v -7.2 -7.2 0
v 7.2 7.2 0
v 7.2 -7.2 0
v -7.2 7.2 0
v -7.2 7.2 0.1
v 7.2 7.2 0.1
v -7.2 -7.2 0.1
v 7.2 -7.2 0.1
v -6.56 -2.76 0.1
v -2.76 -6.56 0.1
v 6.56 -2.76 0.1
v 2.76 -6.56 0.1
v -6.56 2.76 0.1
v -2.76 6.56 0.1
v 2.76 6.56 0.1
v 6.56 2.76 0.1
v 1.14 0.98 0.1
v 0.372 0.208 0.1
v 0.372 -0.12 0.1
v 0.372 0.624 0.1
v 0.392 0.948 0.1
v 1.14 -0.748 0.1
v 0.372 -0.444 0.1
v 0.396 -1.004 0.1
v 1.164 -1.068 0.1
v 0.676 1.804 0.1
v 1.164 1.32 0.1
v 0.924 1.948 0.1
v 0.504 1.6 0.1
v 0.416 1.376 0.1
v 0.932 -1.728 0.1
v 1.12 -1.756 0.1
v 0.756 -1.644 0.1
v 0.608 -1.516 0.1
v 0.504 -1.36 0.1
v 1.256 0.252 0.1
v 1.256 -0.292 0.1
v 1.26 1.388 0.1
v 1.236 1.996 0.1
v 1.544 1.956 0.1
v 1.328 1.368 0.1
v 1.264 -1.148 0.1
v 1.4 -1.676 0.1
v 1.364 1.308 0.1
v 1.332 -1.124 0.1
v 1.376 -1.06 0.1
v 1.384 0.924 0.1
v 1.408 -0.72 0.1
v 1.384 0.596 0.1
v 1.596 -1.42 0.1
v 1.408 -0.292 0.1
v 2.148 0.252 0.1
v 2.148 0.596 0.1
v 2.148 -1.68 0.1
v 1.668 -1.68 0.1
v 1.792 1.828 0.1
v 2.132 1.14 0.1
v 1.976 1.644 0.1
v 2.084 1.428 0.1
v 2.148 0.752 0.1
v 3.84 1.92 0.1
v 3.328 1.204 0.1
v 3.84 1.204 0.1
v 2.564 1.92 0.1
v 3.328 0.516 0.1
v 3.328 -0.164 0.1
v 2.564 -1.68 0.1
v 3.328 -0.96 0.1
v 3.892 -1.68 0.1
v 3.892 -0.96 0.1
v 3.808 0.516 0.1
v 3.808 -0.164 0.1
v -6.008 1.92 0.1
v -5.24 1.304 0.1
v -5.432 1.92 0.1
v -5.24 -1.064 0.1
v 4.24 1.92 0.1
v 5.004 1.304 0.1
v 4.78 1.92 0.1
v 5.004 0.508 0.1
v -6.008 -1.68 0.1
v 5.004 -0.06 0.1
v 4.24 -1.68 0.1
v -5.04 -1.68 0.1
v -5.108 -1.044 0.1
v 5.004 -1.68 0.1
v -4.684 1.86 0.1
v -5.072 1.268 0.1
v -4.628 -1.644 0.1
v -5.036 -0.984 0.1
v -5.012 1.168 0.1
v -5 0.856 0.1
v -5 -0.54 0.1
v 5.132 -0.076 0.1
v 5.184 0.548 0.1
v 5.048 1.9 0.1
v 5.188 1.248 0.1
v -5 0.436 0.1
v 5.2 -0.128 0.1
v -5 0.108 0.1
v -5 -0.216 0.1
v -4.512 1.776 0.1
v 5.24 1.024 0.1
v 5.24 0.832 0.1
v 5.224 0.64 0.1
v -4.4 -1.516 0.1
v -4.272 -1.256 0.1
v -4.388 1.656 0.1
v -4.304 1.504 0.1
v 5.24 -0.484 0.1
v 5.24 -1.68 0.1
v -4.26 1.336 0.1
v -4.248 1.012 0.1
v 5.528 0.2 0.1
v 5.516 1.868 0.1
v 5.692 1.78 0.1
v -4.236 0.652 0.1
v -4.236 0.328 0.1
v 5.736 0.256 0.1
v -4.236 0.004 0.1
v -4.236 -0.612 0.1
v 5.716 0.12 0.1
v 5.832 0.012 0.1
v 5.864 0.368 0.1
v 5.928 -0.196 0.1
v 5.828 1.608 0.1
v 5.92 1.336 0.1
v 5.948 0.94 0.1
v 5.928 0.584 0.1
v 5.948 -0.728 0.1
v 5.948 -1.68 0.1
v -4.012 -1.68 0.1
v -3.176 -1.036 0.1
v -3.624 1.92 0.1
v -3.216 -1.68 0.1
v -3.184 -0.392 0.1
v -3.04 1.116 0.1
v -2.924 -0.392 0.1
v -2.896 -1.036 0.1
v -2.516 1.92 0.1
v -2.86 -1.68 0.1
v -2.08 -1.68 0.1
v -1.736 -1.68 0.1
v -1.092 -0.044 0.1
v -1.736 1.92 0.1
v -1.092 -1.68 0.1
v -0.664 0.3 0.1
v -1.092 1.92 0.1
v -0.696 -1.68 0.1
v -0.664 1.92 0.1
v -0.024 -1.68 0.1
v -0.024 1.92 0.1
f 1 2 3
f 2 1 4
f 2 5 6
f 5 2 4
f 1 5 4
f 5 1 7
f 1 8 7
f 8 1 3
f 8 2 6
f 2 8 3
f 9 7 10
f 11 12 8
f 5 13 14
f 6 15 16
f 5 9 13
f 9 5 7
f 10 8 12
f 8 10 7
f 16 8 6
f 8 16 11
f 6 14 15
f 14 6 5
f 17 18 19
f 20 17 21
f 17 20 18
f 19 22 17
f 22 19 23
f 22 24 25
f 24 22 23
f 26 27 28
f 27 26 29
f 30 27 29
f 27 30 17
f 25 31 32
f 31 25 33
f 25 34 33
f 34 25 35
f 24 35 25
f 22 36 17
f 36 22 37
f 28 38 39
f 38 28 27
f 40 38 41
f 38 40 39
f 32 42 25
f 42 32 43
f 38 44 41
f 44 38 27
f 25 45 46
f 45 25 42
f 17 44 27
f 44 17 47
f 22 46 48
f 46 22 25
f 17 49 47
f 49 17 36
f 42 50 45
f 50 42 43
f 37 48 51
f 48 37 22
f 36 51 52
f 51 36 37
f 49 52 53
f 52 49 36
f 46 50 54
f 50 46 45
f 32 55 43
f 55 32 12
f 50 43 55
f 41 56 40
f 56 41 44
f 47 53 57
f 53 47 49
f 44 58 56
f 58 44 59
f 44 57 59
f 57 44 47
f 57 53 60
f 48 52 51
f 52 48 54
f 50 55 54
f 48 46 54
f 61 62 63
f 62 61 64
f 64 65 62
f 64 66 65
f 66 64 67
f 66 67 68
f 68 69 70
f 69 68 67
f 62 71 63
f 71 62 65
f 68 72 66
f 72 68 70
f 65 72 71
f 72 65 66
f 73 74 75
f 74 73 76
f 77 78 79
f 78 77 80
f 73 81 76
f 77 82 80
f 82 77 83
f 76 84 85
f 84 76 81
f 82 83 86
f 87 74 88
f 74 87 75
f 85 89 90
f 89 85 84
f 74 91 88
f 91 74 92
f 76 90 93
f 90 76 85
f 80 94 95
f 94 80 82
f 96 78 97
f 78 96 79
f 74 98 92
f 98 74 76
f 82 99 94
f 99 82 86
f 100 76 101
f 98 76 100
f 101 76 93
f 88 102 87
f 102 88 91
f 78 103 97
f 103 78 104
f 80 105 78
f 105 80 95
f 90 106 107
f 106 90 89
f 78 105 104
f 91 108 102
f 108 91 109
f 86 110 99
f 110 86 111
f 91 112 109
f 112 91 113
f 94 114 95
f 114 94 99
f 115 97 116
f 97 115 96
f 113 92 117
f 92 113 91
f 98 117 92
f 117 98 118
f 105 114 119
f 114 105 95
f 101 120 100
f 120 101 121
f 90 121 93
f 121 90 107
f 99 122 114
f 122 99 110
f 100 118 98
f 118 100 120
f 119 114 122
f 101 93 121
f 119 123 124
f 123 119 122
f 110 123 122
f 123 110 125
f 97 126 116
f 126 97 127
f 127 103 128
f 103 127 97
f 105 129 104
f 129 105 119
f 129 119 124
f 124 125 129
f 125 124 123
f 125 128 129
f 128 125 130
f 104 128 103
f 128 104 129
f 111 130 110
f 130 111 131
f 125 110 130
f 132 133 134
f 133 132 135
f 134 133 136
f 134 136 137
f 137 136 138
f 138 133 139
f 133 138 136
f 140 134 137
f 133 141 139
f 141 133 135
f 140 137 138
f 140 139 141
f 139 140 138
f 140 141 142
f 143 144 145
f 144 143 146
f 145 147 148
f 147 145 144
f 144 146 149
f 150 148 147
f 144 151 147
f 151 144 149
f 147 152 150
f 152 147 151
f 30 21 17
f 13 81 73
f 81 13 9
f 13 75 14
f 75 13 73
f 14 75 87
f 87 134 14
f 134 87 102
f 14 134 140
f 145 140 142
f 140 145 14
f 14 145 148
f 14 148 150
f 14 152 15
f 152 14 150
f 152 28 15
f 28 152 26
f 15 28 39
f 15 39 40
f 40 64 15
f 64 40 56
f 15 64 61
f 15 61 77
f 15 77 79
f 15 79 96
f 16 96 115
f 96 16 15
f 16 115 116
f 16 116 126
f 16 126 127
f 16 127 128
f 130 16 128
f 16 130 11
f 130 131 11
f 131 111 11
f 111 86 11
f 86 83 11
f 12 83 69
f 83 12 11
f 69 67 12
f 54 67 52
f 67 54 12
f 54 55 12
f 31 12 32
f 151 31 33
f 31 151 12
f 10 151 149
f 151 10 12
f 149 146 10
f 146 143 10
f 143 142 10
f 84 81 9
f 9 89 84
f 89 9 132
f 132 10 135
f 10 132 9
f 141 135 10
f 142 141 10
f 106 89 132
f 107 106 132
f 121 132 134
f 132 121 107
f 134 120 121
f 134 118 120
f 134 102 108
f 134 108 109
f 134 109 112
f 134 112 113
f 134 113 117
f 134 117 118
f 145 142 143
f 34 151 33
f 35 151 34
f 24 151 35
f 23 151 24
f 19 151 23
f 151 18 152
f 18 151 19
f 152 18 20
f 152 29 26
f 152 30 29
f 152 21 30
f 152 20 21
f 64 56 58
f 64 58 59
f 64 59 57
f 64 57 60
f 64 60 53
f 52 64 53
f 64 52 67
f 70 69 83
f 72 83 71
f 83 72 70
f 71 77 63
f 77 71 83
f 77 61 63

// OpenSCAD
// file: ../p/box5-12.scad
use <../lib.scad>
function ldraw_lib__box5_12() = [
// 0 Box with 5 Faces without Any Edges
// 0 Name: box5-12.dat
// 0 Author: Chris Dee [cwdee]
// 0 !LDRAW_ORG Primitive UPDATE 2009-02
// 0 !LICENSE Licensed under CC BY 4.0 : see CAreadme.txt
// 
// 0 BFC CERTIFY CCW
  [0,"BFC","CERTIFY"],
  [0,"BFC","CCW"],
// 
// 0 !HISTORY 2009-09-03 [PTadmin] Official Update 2009-02
// 
// 
// 4 16 1 1 1 1 1 -1 -1 1 -1 -1 1 1
  [4,16,1,1,1,1,1,-1,-1,1,-1,-1,1,1],
// 4 16 -1 0 1 1 0 1 1 1 1 -1 1 1
  [4,16,-1,0,1,1,0,1,1,1,1,-1,1,1],
// 4 16 -1 0 -1 -1 0 1 -1 1 1 -1 1 -1
  [4,16,-1,0,-1,-1,0,1,-1,1,1,-1,1,-1],
// 4 16 1 0 -1 -1 0 -1 -1 1 -1 1 1 -1
  [4,16,1,0,-1,-1,0,-1,-1,1,-1,1,1,-1],
// 4 16 1 0 1 1 0 -1 1 1 -1 1 1 1
  [4,16,1,0,1,1,0,-1,1,1,-1,1,1,1],
// 0
];
module ldraw_lib__box5_12(step=0, col=false, unit=2/5, alt=false, line=0.2, solid=!$preview)
    makepoly(ldraw_lib__box5_12(), step=step, col=col, unit=unit, alt=alt, line=line, solid=solid);
ldraw_lib__box5_12(line=0.2);
// main file
use <../lib.scad>
use <../p/box5-12.scad>
function ldraw_lib__4222889d() = [
// 0 Sticker  1.8 x  1.8 with Black "DANGER" in Black Octagon
// 0 Name: 4222889d.dat
// 0 Author: Gerald Lasser [GeraldLasser]
// 0 !LDRAW_ORG Part UPDATE 2024-04
// 0 !LICENSE Licensed under CC BY 4.0 : see CAreadme.txt
// 
// 0 BFC CERTIFY CCW
  [0,"BFC","CERTIFY"],
  [0,"BFC","CCW"],
// 
// 0 !KEYWORDS Bricklink 4855stk01, Set 4855
// 
// 0 !HISTORY 2024-05-28 [OrionP] Official Update 2024-04
// 
// 
// 1 16 0 -.25 0 18 0 0 0 .25 0 0 0 18 box5-12.dat
  [1,16,0,-.25,0,18,0,0,0,.25,0,0,0,18, ldraw_lib__box5_12()],
// 0 // Font: Impact
// 3 0 -16.4 -.25 -6.9 -18 -.25 -18 -6.9 -.25 -16.4
  [3,0,-16.4,-.25,-6.9,-18,-.25,-18,-6.9,-.25,-16.4],
// 3 0 16.4 -.25 -6.9 6.9 -.25 -16.4 18 -.25 -18
  [3,0,16.4,-.25,-6.9,6.9,-.25,-16.4,18,-.25,-18],
// 3 0 -18 -.25 18 -16.4 -.25 6.9 -6.9 -.25 16.4
  [3,0,-18,-.25,18,-16.4,-.25,6.9,-6.9,-.25,16.4],
// 3 0 18 -.25 18 6.9 -.25 16.4 16.4 -.25 6.9
  [3,0,18,-.25,18,6.9,-.25,16.4,16.4,-.25,6.9],
// 4 0 -16.4 -.25 -6.9 -16.4 -.25 6.9 -18 -.25 18 -18 -.25 -18
  [4,0,-16.4,-.25,-6.9,-16.4,-.25,6.9,-18,-.25,18,-18,-.25,-18],
// 4 0 -6.9 -.25 -16.4 -18 -.25 -18 18 -.25 -18 6.9 -.25 -16.4
  [4,0,-6.9,-.25,-16.4,-18,-.25,-18,18,-.25,-18,6.9,-.25,-16.4],
// 4 0 16.4 -.25 6.9 16.4 -.25 -6.9 18 -.25 -18 18 -.25 18
  [4,0,16.4,-.25,6.9,16.4,-.25,-6.9,18,-.25,-18,18,-.25,18],
// 4 0 -18 -.25 18 -6.9 -.25 16.4 6.9 -.25 16.4 18 -.25 18
  [4,0,-18,-.25,18,-6.9,-.25,16.4,6.9,-.25,16.4,18,-.25,18],
// 3 0 2.85 -.25 2.45 .93 -.25 .52 .93 -.25 -.3
  [3,0,2.85,-.25,2.45,.93,-.25,.52,.93,-.25,-.3],
// 4 0 .93 -.25 1.56 .93 -.25 .52 2.85 -.25 2.45 .98 -.25 2.37
  [4,0,.93,-.25,1.56,.93,-.25,.52,2.85,-.25,2.45,.98,-.25,2.37],
// 4 0 2.85 -.25 2.45 .93 -.25 -.3 .93 -.25 -1.11 2.85 -.25 -1.87
  [4,0,2.85,-.25,2.45,.93,-.25,-.3,.93,-.25,-1.11,2.85,-.25,-1.87],
// 4 0 2.85 -.25 -1.87 .93 -.25 -1.11 .99 -.25 -2.51 2.91 -.25 -2.67
  [4,0,2.85,-.25,-1.87,.93,-.25,-1.11,.99,-.25,-2.51,2.91,-.25,-2.67],
// 4 0 1.69 -.25 4.51 1.26 -.25 4 2.91 -.25 3.3 2.31 -.25 4.87
  [4,0,1.69,-.25,4.51,1.26,-.25,4,2.91,-.25,3.3,2.31,-.25,4.87],
// 4 0 1.04 -.25 3.44 2.85 -.25 2.45 2.91 -.25 3.3 1.26 -.25 4
  [4,0,1.04,-.25,3.44,2.85,-.25,2.45,2.91,-.25,3.3,1.26,-.25,4],
// 4 0 2.33 -.25 -4.32 2.8 -.25 -4.39 2.91 -.25 -2.67 1.89 -.25 -4.11
  [4,0,2.33,-.25,-4.32,2.8,-.25,-4.39,2.91,-.25,-2.67,1.89,-.25,-4.11],
// 4 0 2.91 -.25 -2.67 1.26 -.25 -3.4 1.52 -.25 -3.79 1.89 -.25 -4.11
  [4,0,2.91,-.25,-2.67,1.26,-.25,-3.4,1.52,-.25,-3.79,1.89,-.25,-4.11],
// 3 0 .99 -.25 -2.51 1.26 -.25 -3.4 2.91 -.25 -2.67
  [3,0,.99,-.25,-2.51,1.26,-.25,-3.4,2.91,-.25,-2.67],
// 4 16 2.85 -.25 2.45 2.85 -.25 -1.87 3.14 -.25 -.73 3.14 -.25 .63
  [4,16,2.85,-.25,2.45,2.85,-.25,-1.87,3.14,-.25,-.73,3.14,-.25,.63],
// 4 0 2.31 -.25 4.87 2.91 -.25 3.3 3.15 -.25 3.47 3.09 -.25 4.99
  [4,0,2.31,-.25,4.87,2.91,-.25,3.3,3.15,-.25,3.47,3.09,-.25,4.99],
// 4 0 3.09 -.25 4.99 3.15 -.25 3.47 3.32 -.25 3.42 3.86 -.25 4.89
  [4,0,3.09,-.25,4.99,3.15,-.25,3.47,3.32,-.25,3.42,3.86,-.25,4.89],
// 4 0 3.16 -.25 -2.87 2.91 -.25 -2.67 2.8 -.25 -4.39 3.5 -.25 -4.19
  [4,0,3.16,-.25,-2.87,2.91,-.25,-2.67,2.8,-.25,-4.39,3.5,-.25,-4.19],
// 4 16 3.41 -.25 3.27 3.32 -.25 3.42 3.15 -.25 3.47 2.91 -.25 3.3
  [4,16,3.41,-.25,3.27,3.32,-.25,3.42,3.15,-.25,3.47,2.91,-.25,3.3],
// 4 16 3.16 -.25 -2.87 3.33 -.25 -2.81 3.44 -.25 -2.65 2.91 -.25 -2.67
  [4,16,3.16,-.25,-2.87,3.33,-.25,-2.81,3.44,-.25,-2.65,2.91,-.25,-2.67],
// 4 16 3.41 -.25 3.27 2.91 -.25 3.3 2.85 -.25 2.45 3.46 -.25 2.31
  [4,16,3.41,-.25,3.27,2.91,-.25,3.3,2.85,-.25,2.45,3.46,-.25,2.31],
// 4 16 2.85 -.25 -1.87 2.91 -.25 -2.67 3.44 -.25 -2.65 3.52 -.25 -1.8
  [4,16,2.85,-.25,-1.87,2.91,-.25,-2.67,3.44,-.25,-2.65,3.52,-.25,-1.8],
// 4 16 3.46 -.25 1.49 3.46 -.25 2.31 2.85 -.25 2.45 3.14 -.25 .63
  [4,16,3.46,-.25,1.49,3.46,-.25,2.31,2.85,-.25,2.45,3.14,-.25,.63],
// 4 0 3.33 -.25 -2.81 3.16 -.25 -2.87 3.5 -.25 -4.19 3.99 -.25 -3.55
  [4,0,3.33,-.25,-2.81,3.16,-.25,-2.87,3.5,-.25,-4.19,3.99,-.25,-3.55],
// 4 16 3.14 -.25 -.73 2.85 -.25 -1.87 3.52 -.25 -1.8 3.52 -.25 -.73
  [4,16,3.14,-.25,-.73,2.85,-.25,-1.87,3.52,-.25,-1.8,3.52,-.25,-.73],
// 4 0 3.14 -.25 .63 3.14 -.25 -.73 3.52 -.25 -.73 5.37 -.25 .63
  [4,0,3.14,-.25,.63,3.14,-.25,-.73,3.52,-.25,-.73,5.37,-.25,.63],
// 4 16 3.46 -.25 1.49 3.14 -.25 .63 5.37 -.25 .63 5.37 -.25 1.49
  [4,16,3.46,-.25,1.49,3.14,-.25,.63,5.37,-.25,.63,5.37,-.25,1.49],
// 4 0 3.44 -.25 -2.65 3.33 -.25 -2.81 3.99 -.25 -3.55 5.37 -.25 -4.2
  [4,0,3.44,-.25,-2.65,3.33,-.25,-2.81,3.99,-.25,-3.55,5.37,-.25,-4.2],
// 4 16 4.17 -.25 -4.2 3.5 -.25 -4.19 2.8 -.25 -4.39 6.9 -.25 -16.4
  [4,16,4.17,-.25,-4.2,3.5,-.25,-4.19,2.8,-.25,-4.39,6.9,-.25,-16.4],
// 3 16 3.99 -.25 -3.55 3.5 -.25 -4.19 4.17 -.25 -4.2
  [3,16,3.99,-.25,-3.55,3.5,-.25,-4.19,4.17,-.25,-4.2],
// 4 0 4.48 -.25 4.57 3.86 -.25 4.89 3.32 -.25 3.42 3.41 -.25 3.27
  [4,0,4.48,-.25,4.57,3.86,-.25,4.89,3.32,-.25,3.42,3.41,-.25,3.27],
// 4 0 3.46 -.25 2.31 3.46 -.25 1.49 5.37 -.25 1.49 5.33 -.25 2.85
  [4,0,3.46,-.25,2.31,3.46,-.25,1.49,5.37,-.25,1.49,5.33,-.25,2.85],
// 4 0 3.41 -.25 3.27 5.21 -.25 3.57 4.94 -.25 4.11 4.48 -.25 4.57
  [4,0,3.41,-.25,3.27,5.21,-.25,3.57,4.94,-.25,4.11,4.48,-.25,4.57],
// 4 0 3.41 -.25 3.27 3.46 -.25 2.31 5.33 -.25 2.85 5.21 -.25 3.57
  [4,0,3.41,-.25,3.27,3.46,-.25,2.31,5.33,-.25,2.85,5.21,-.25,3.57],
// 3 0 5.33 -.25 2.85 5.37 -.25 1.49 5.37 -.25 1.88
  [3,0,5.33,-.25,2.85,5.37,-.25,1.49,5.37,-.25,1.88],
// 4 0 5.37 -.25 -4.2 5.37 -.25 .63 3.52 -.25 -.73 3.52 -.25 -1.8
  [4,0,5.37,-.25,-4.2,5.37,-.25,.63,3.52,-.25,-.73,3.52,-.25,-1.8],
// 3 0 3.99 -.25 -3.55 4.17 -.25 -4.2 5.37 -.25 -4.2
  [3,0,3.99,-.25,-3.55,4.17,-.25,-4.2,5.37,-.25,-4.2],
// 3 0 3.52 -.25 -1.8 3.44 -.25 -2.65 5.37 -.25 -4.2
  [3,0,3.52,-.25,-1.8,3.44,-.25,-2.65,5.37,-.25,-4.2],
// 4 0 9.6 -.25 4.8 6.41 -.25 4.8 8.32 -.25 3.01 9.6 -.25 3.01
  [4,0,9.6,-.25,4.8,6.41,-.25,4.8,8.32,-.25,3.01,9.6,-.25,3.01],
// 3 0 6.41 -.25 4.8 8.32 -.25 1.29 8.32 -.25 3.01
  [3,0,6.41,-.25,4.8,8.32,-.25,1.29,8.32,-.25,3.01],
// 4 0 8.32 -.25 -.41 8.32 -.25 1.29 6.41 -.25 4.8 6.41 -.25 -4.2
  [4,0,8.32,-.25,-.41,8.32,-.25,1.29,6.41,-.25,4.8,6.41,-.25,-4.2],
// 3 0 8.32 -.25 -.41 6.41 -.25 -4.2 8.32 -.25 -2.4
  [3,0,8.32,-.25,-.41,6.41,-.25,-4.2,8.32,-.25,-2.4],
// 4 0 8.32 -.25 -2.4 6.41 -.25 -4.2 9.73 -.25 -4.2 9.73 -.25 -2.4
  [4,0,8.32,-.25,-2.4,6.41,-.25,-4.2,9.73,-.25,-4.2,9.73,-.25,-2.4],
// 4 16 8.32 -.25 3.01 8.32 -.25 1.29 9.52 -.25 1.29 9.6 -.25 3.01
  [4,16,8.32,-.25,3.01,8.32,-.25,1.29,9.52,-.25,1.29,9.6,-.25,3.01],
// 4 16 8.32 -.25 -2.4 9.73 -.25 -2.4 9.52 -.25 -.41 8.32 -.25 -.41
  [4,16,8.32,-.25,-2.4,9.73,-.25,-2.4,9.52,-.25,-.41,8.32,-.25,-.41],
// 4 0 9.52 -.25 1.29 8.32 -.25 1.29 8.32 -.25 -.41 9.52 -.25 -.41
  [4,0,9.52,-.25,1.29,8.32,-.25,1.29,8.32,-.25,-.41,9.52,-.25,-.41],
// 4 0 -13.1 -.25 3.26 -13.58 -.25 4.8 -15.02 -.25 4.8 -13.1 -.25 -2.66
  [4,0,-13.1,-.25,3.26,-13.58,-.25,4.8,-15.02,-.25,4.8,-13.1,-.25,-2.66],
// 4 0 12.51 -.25 3.26 11.95 -.25 4.8 10.6 -.25 4.8 12.51 -.25 1.27
  [4,0,12.51,-.25,3.26,11.95,-.25,4.8,10.6,-.25,4.8,12.51,-.25,1.27],
// 3 0 -15.02 -.25 4.8 -15.02 -.25 -4.2 -13.1 -.25 -2.66
  [3,0,-15.02,-.25,4.8,-15.02,-.25,-4.2,-13.1,-.25,-2.66],
// 4 0 12.51 -.25 -.15 12.51 -.25 1.27 10.6 -.25 4.8 10.6 -.25 -4.2
  [4,0,12.51,-.25,-.15,12.51,-.25,1.27,10.6,-.25,4.8,10.6,-.25,-4.2],
// 4 0 -12.6 -.25 -4.2 -12.77 -.25 -2.61 -13.1 -.25 -2.66 -15.02 -.25 -4.2
  [4,0,-12.6,-.25,-4.2,-12.77,-.25,-2.61,-13.1,-.25,-2.66,-15.02,-.25,-4.2],
// 3 0 12.51 -.25 -.15 10.6 -.25 -4.2 12.51 -.25 -4.2
  [3,0,12.51,-.25,-.15,10.6,-.25,-4.2,12.51,-.25,-4.2],
// 4 0 -13.58 -.25 4.8 -13.1 -.25 3.26 -12.68 -.25 3.17 -11.71 -.25 4.65
  [4,0,-13.58,-.25,4.8,-13.1,-.25,3.26,-12.68,-.25,3.17,-11.71,-.25,4.65],
// 4 0 -12.59 -.25 -2.46 -12.77 -.25 -2.61 -12.6 -.25 -4.2 -11.57 -.25 -4.11
  [4,0,-12.59,-.25,-2.46,-12.77,-.25,-2.61,-12.6,-.25,-4.2,-11.57,-.25,-4.11],
// 4 16 -12.53 -.25 2.92 -12.68 -.25 3.17 -13.1 -.25 3.26 -12.5 -.25 2.14
  [4,16,-12.53,-.25,2.92,-12.68,-.25,3.17,-13.1,-.25,3.26,-12.5,-.25,2.14],
// 4 16 -13.1 -.25 -2.66 -12.77 -.25 -2.61 -12.59 -.25 -2.46 -12.5 -.25 -1.35
  [4,16,-13.1,-.25,-2.66,-12.77,-.25,-2.61,-12.59,-.25,-2.46,-12.5,-.25,-1.35],
// 4 0 12.51 -.25 1.27 12.51 -.25 -.15 12.83 -.25 -.19 12.96 -.25 1.37
  [4,0,12.51,-.25,1.27,12.51,-.25,-.15,12.83,-.25,-.19,12.96,-.25,1.37],
// 4 0 12.62 -.25 4.75 11.95 -.25 4.8 12.51 -.25 3.26 12.97 -.25 3.12
  [4,0,12.62,-.25,4.75,11.95,-.25,4.8,12.51,-.25,3.26,12.97,-.25,3.12],
// 4 16 -12.5 -.25 2.14 -13.1 -.25 3.26 -13.1 -.25 -2.66 -12.5 -.25 1.09
  [4,16,-12.5,-.25,2.14,-13.1,-.25,3.26,-13.1,-.25,-2.66,-12.5,-.25,1.09],
// 4 16 12.83 -.25 -.19 12.51 -.25 -.15 12.51 -.25 -4.2 13 -.25 -.32
  [4,16,12.83,-.25,-.19,12.51,-.25,-.15,12.51,-.25,-4.2,13,-.25,-.32],
// 3 16 -12.5 -.25 .27 -13.1 -.25 -2.66 -12.5 -.25 -.54
  [3,16,-12.5,-.25,.27,-13.1,-.25,-2.66,-12.5,-.25,-.54],
// 3 16 -12.5 -.25 1.09 -13.1 -.25 -2.66 -12.5 -.25 .27
  [3,16,-12.5,-.25,1.09,-13.1,-.25,-2.66,-12.5,-.25,.27],
// 3 16 -12.5 -.25 -.54 -13.1 -.25 -2.66 -12.5 -.25 -1.35
  [3,16,-12.5,-.25,-.54,-13.1,-.25,-2.66,-12.5,-.25,-1.35],
// 4 0 -12.53 -.25 2.92 -11.28 -.25 4.44 -11.71 -.25 4.65 -12.68 -.25 3.17
  [4,0,-12.53,-.25,2.92,-11.28,-.25,4.44,-11.71,-.25,4.65,-12.68,-.25,3.17],
// 4 16 13.1 -.25 2.56 12.97 -.25 3.12 12.51 -.25 3.26 13.1 -.25 2.08
  [4,16,13.1,-.25,2.56,12.97,-.25,3.12,12.51,-.25,3.26,13.1,-.25,2.08],
// 4 16 12.51 -.25 1.27 12.96 -.25 1.37 13.06 -.25 1.6 12.51 -.25 3.26
  [4,16,12.51,-.25,1.27,12.96,-.25,1.37,13.06,-.25,1.6,12.51,-.25,3.26],
// 4 0 -12.59 -.25 -2.46 -11.57 -.25 -4.11 -11 -.25 -3.79 -10.68 -.25 -3.14
  [4,0,-12.59,-.25,-2.46,-11.57,-.25,-4.11,-11,-.25,-3.79,-10.68,-.25,-3.14],
// 3 16 12.51 -.25 3.26 13.06 -.25 1.6 13.1 -.25 2.08
  [3,16,12.51,-.25,3.26,13.06,-.25,1.6,13.1,-.25,2.08],
// 4 0 -12.53 -.25 2.92 -10.76 -.25 3.76 -10.97 -.25 4.14 -11.28 -.25 4.44
  [4,0,-12.53,-.25,2.92,-10.76,-.25,3.76,-10.97,-.25,4.14,-11.28,-.25,4.44],
// 4 16 13.1 -.25 -1.21 13 -.25 -.32 12.51 -.25 -4.2 13.1 -.25 -4.2
  [4,16,13.1,-.25,-1.21,13,-.25,-.32,12.51,-.25,-4.2,13.1,-.25,-4.2],
// 4 0 -12.53 -.25 2.92 -10.62 -.25 2.53 -10.65 -.25 3.34 -10.76 -.25 3.76
  [4,0,-12.53,-.25,2.92,-10.62,-.25,2.53,-10.65,-.25,3.34,-10.76,-.25,3.76],
// 4 0 12.83 -.25 -.19 13 -.25 -.32 13.82 -.25 .5 12.96 -.25 1.37
  [4,0,12.83,-.25,-.19,13,-.25,-.32,13.82,-.25,.5,12.96,-.25,1.37],
// 4 0 13.79 -.25 4.67 12.62 -.25 4.75 12.97 -.25 3.12 14.23 -.25 4.45
  [4,0,13.79,-.25,4.67,12.62,-.25,4.75,12.97,-.25,3.12,14.23,-.25,4.45],
// 4 0 -10.62 -.25 2.53 -12.53 -.25 2.92 -12.5 -.25 2.14 -10.59 -.25 1.63
  [4,0,-10.62,-.25,2.53,-12.53,-.25,2.92,-12.5,-.25,2.14,-10.59,-.25,1.63],
// 4 0 -12.5 -.25 1.09 -10.59 -.25 .82 -10.59 -.25 1.63 -12.5 -.25 2.14
  [4,0,-12.5,-.25,1.09,-10.59,-.25,.82,-10.59,-.25,1.63,-12.5,-.25,2.14],
// 4 0 13.06 -.25 1.6 12.96 -.25 1.37 13.82 -.25 .5 14.34 -.25 .64
  [4,0,13.06,-.25,1.6,12.96,-.25,1.37,13.82,-.25,.5,14.34,-.25,.64],
// 4 0 -12.5 -.25 -.54 -10.59 -.25 -1.53 -10.59 -.25 .01 -12.5 -.25 .27
  [4,0,-12.5,-.25,-.54,-10.59,-.25,-1.53,-10.59,-.25,.01,-12.5,-.25,.27],
// 4 0 -10.59 -.25 -1.53 -12.5 -.25 -1.35 -12.59 -.25 -2.46 -10.68 -.25 -3.14
  [4,0,-10.59,-.25,-1.53,-12.5,-.25,-1.35,-12.59,-.25,-2.46,-10.68,-.25,-3.14],
// 4 0 13 -.25 -.32 13.1 -.25 -1.21 14.29 -.25 .3 13.82 -.25 .5
  [4,0,13,-.25,-.32,13.1,-.25,-1.21,14.29,-.25,.3,13.82,-.25,.5],
// 4 0 -12.5 -.25 .27 -10.59 -.25 .01 -10.59 -.25 .82 -12.5 -.25 1.09
  [4,0,-12.5,-.25,.27,-10.59,-.25,.01,-10.59,-.25,.82,-12.5,-.25,1.09],
// 3 16 14.34 -.25 .64 13.82 -.25 .5 14.29 -.25 .3
  [3,16,14.34,-.25,.64,13.82,-.25,.5,14.29,-.25,.3],
// 3 0 -12.5 -.25 -.54 -12.5 -.25 -1.35 -10.59 -.25 -1.53
  [3,0,-12.5,-.25,-.54,-12.5,-.25,-1.35,-10.59,-.25,-1.53],
// 4 16 14.34 -.25 .64 14.29 -.25 .3 14.58 -.25 .03 14.66 -.25 .92
  [4,16,14.34,-.25,.64,14.29,-.25,.3,14.58,-.25,.03,14.66,-.25,.92],
// 4 0 14.58 -.25 .03 14.29 -.25 .3 13.1 -.25 -1.21 14.82 -.25 -.49
  [4,0,14.58,-.25,.03,14.29,-.25,.3,13.1,-.25,-1.21,14.82,-.25,-.49],
// 4 0 14.57 -.25 4.02 14.23 -.25 4.45 12.97 -.25 3.12 14.8 -.25 3.34
  [4,0,14.57,-.25,4.02,14.23,-.25,4.45,12.97,-.25,3.12,14.8,-.25,3.34],
// 4 0 14.8 -.25 3.34 12.97 -.25 3.12 13.1 -.25 2.56 14.87 -.25 2.35
  [4,0,14.8,-.25,3.34,12.97,-.25,3.12,13.1,-.25,2.56,14.87,-.25,2.35],
// 4 0 13.06 -.25 1.6 14.34 -.25 .64 14.82 -.25 1.46 13.1 -.25 2.08
  [4,0,13.06,-.25,1.6,14.34,-.25,.64,14.82,-.25,1.46,13.1,-.25,2.08],
// 3 0 14.82 -.25 1.46 14.34 -.25 .64 14.66 -.25 .92
  [3,0,14.82,-.25,1.46,14.34,-.25,.64,14.66,-.25,.92],
// 4 16 14.82 -.25 -.49 14.82 -.25 1.46 14.66 -.25 .92 14.58 -.25 .03
  [4,16,14.82,-.25,-.49,14.82,-.25,1.46,14.66,-.25,.92,14.58,-.25,.03],
// 4 16 14.87 -.25 2.35 14.82 -.25 1.46 14.82 -.25 -.49 14.87 -.25 -1.82
  [4,16,14.87,-.25,2.35,14.82,-.25,1.46,14.82,-.25,-.49,14.87,-.25,-1.82],
// 4 0 13.1 -.25 2.08 14.82 -.25 1.46 14.87 -.25 2.35 13.1 -.25 2.56
  [4,0,13.1,-.25,2.08,14.82,-.25,1.46,14.87,-.25,2.35,13.1,-.25,2.56],
// 4 0 13.1 -.25 -4.2 14.87 -.25 -4.2 14.87 -.25 -1.82 13.1 -.25 -1.21
  [4,0,13.1,-.25,-4.2,14.87,-.25,-4.2,14.87,-.25,-1.82,13.1,-.25,-1.21],
// 3 0 14.82 -.25 -.49 13.1 -.25 -1.21 14.87 -.25 -1.82
  [3,0,14.82,-.25,-.49,13.1,-.25,-1.21,14.87,-.25,-1.82],
// 4 0 -9.06 -.25 4.8 -10.03 -.25 -4.2 -8.04 -.25 -4.2 -7.94 -.25 -2.59
  [4,0,-9.06,-.25,4.8,-10.03,-.25,-4.2,-8.04,-.25,-4.2,-7.94,-.25,-2.59],
// 3 0 -9.06 -.25 4.8 -7.94 -.25 -2.59 -7.96 -.25 -.98
  [3,0,-9.06,-.25,4.8,-7.94,-.25,-2.59,-7.96,-.25,-.98],
// 3 0 -9.06 -.25 4.8 -7.96 -.25 -.98 -7.6 -.25 2.79
  [3,0,-9.06,-.25,4.8,-7.96,-.25,-.98,-7.6,-.25,2.79],
// 3 16 -7.6 -.25 2.79 -7.96 -.25 -.98 -7.31 -.25 -.98
  [3,16,-7.6,-.25,2.79,-7.96,-.25,-.98,-7.31,-.25,-.98],
// 4 0 -7.94 -.25 -2.59 -7.24 -.25 -2.59 -7.31 -.25 -.98 -7.96 -.25 -.98
  [4,0,-7.94,-.25,-2.59,-7.24,-.25,-2.59,-7.31,-.25,-.98,-7.96,-.25,-.98],
// 3 0 -6.29 -.25 4.8 -9.06 -.25 4.8 -7.6 -.25 2.79
  [3,0,-6.29,-.25,4.8,-9.06,-.25,4.8,-7.6,-.25,2.79],
// 4 16 -7.94 -.25 -2.59 -8.04 -.25 -4.2 -7.15 -.25 -4.2 -7.24 -.25 -2.59
  [4,16,-7.94,-.25,-2.59,-8.04,-.25,-4.2,-7.15,-.25,-4.2,-7.24,-.25,-2.59],
// 3 0 -6.29 -.25 4.8 -7.6 -.25 2.79 -7.31 -.25 -.98
  [3,0,-6.29,-.25,4.8,-7.6,-.25,2.79,-7.31,-.25,-.98],
// 4 0 -6.29 -.25 4.8 -7.31 -.25 -.98 -7.24 -.25 -2.59 -7.15 -.25 -4.2
  [4,0,-6.29,-.25,4.8,-7.31,-.25,-.98,-7.24,-.25,-2.59,-7.15,-.25,-4.2],
// 3 0 -6.29 -.25 4.8 -7.15 -.25 -4.2 -5.2 -.25 -4.2
  [3,0,-6.29,-.25,4.8,-7.15,-.25,-4.2,-5.2,-.25,-4.2],
// 4 0 -2.73 -.25 -.11 -4.34 -.25 4.8 -4.34 -.25 -4.2 -2.73 -.25 -4.2
  [4,0,-2.73,-.25,-.11,-4.34,-.25,4.8,-4.34,-.25,-4.2,-2.73,-.25,-4.2],
// 4 0 -1.66 -.25 .75 -2.73 -.25 4.8 -4.34 -.25 4.8 -2.73 -.25 -.11
  [4,0,-1.66,-.25,.75,-2.73,-.25,4.8,-4.34,-.25,4.8,-2.73,-.25,-.11],
// 3 16 -2.73 -.25 -.11 -2.73 -.25 -4.2 -1.74 -.25 -4.2
  [3,16,-2.73,-.25,-.11,-2.73,-.25,-4.2,-1.74,-.25,-4.2],
// 3 16 -1.66 -.25 4.8 -2.73 -.25 4.8 -1.66 -.25 .75
  [3,16,-1.66,-.25,4.8,-2.73,-.25,4.8,-1.66,-.25,.75],
// 4 0 -2.73 -.25 -.11 -1.74 -.25 -4.2 -.06 -.25 -4.2 -1.66 -.25 .75
  [4,0,-2.73,-.25,-.11,-1.74,-.25,-4.2,-.06,-.25,-4.2,-1.66,-.25,.75],
// 4 0 -.06 -.25 4.8 -1.66 -.25 4.8 -1.66 -.25 .75 -.06 -.25 -4.2
  [4,0,-.06,-.25,4.8,-1.66,-.25,4.8,-1.66,-.25,.75,-.06,-.25,-4.2],
// 3 0 1.04 -.25 3.44 .98 -.25 2.37 2.85 -.25 2.45
  [3,0,1.04,-.25,3.44,.98,-.25,2.37,2.85,-.25,2.45],
// 4 16 -16.4 -.25 6.9 -16.4 -.25 -6.9 -15.02 -.25 -4.2 -15.02 -.25 4.8
  [4,16,-16.4,-.25,6.9,-16.4,-.25,-6.9,-15.02,-.25,-4.2,-15.02,-.25,4.8],
// 4 16 -16.4 -.25 6.9 -15.02 -.25 4.8 -13.58 -.25 4.8 -6.9 -.25 16.4
  [4,16,-16.4,-.25,6.9,-15.02,-.25,4.8,-13.58,-.25,4.8,-6.9,-.25,16.4],
// 3 16 -6.9 -.25 16.4 -13.58 -.25 4.8 -11.71 -.25 4.65
  [3,16,-6.9,-.25,16.4,-13.58,-.25,4.8,-11.71,-.25,4.65],
// 4 16 -6.9 -.25 16.4 -11.71 -.25 4.65 -11.28 -.25 4.44 -9.06 -.25 4.8
  [4,16,-6.9,-.25,16.4,-11.71,-.25,4.65,-11.28,-.25,4.44,-9.06,-.25,4.8],
// 3 16 -6.9 -.25 16.4 -9.06 -.25 4.8 -6.29 -.25 4.8
  [3,16,-6.9,-.25,16.4,-9.06,-.25,4.8,-6.29,-.25,4.8],
// 4 16 -4.34 -.25 4.8 -6.9 -.25 16.4 -6.29 -.25 4.8 -5.2 -.25 -4.2
  [4,16,-4.34,-.25,4.8,-6.9,-.25,16.4,-6.29,-.25,4.8,-5.2,-.25,-4.2],
// 3 16 -6.9 -.25 16.4 -4.34 -.25 4.8 -2.73 -.25 4.8
  [3,16,-6.9,-.25,16.4,-4.34,-.25,4.8,-2.73,-.25,4.8],
// 3 16 -6.9 -.25 16.4 -2.73 -.25 4.8 -1.66 -.25 4.8
  [3,16,-6.9,-.25,16.4,-2.73,-.25,4.8,-1.66,-.25,4.8],
// 4 16 -6.9 -.25 16.4 -1.66 -.25 4.8 -.06 -.25 4.8 6.9 -.25 16.4
  [4,16,-6.9,-.25,16.4,-1.66,-.25,4.8,-.06,-.25,4.8,6.9,-.25,16.4],
// 4 16 6.9 -.25 16.4 -.06 -.25 4.8 1.69 -.25 4.51 2.31 -.25 4.87
  [4,16,6.9,-.25,16.4,-.06,-.25,4.8,1.69,-.25,4.51,2.31,-.25,4.87],
// 3 16 6.9 -.25 16.4 2.31 -.25 4.87 3.09 -.25 4.99
  [3,16,6.9,-.25,16.4,2.31,-.25,4.87,3.09,-.25,4.99],
// 3 16 6.9 -.25 16.4 3.09 -.25 4.99 3.86 -.25 4.89
  [3,16,6.9,-.25,16.4,3.09,-.25,4.99,3.86,-.25,4.89],
// 4 16 6.9 -.25 16.4 3.86 -.25 4.89 4.48 -.25 4.57 6.41 -.25 4.8
  [4,16,6.9,-.25,16.4,3.86,-.25,4.89,4.48,-.25,4.57,6.41,-.25,4.8],
// 3 16 6.9 -.25 16.4 6.41 -.25 4.8 9.6 -.25 4.8
  [3,16,6.9,-.25,16.4,6.41,-.25,4.8,9.6,-.25,4.8],
// 3 16 6.9 -.25 16.4 9.6 -.25 4.8 10.6 -.25 4.8
  [3,16,6.9,-.25,16.4,9.6,-.25,4.8,10.6,-.25,4.8],
// 3 16 6.9 -.25 16.4 10.6 -.25 4.8 11.95 -.25 4.8
  [3,16,6.9,-.25,16.4,10.6,-.25,4.8,11.95,-.25,4.8],
// 3 16 6.9 -.25 16.4 11.95 -.25 4.8 12.62 -.25 4.75
  [3,16,6.9,-.25,16.4,11.95,-.25,4.8,12.62,-.25,4.75],
// 4 16 6.9 -.25 16.4 12.62 -.25 4.75 13.79 -.25 4.67 16.4 -.25 6.9
  [4,16,6.9,-.25,16.4,12.62,-.25,4.75,13.79,-.25,4.67,16.4,-.25,6.9],
// 3 16 16.4 -.25 6.9 13.79 -.25 4.67 14.23 -.25 4.45
  [3,16,16.4,-.25,6.9,13.79,-.25,4.67,14.23,-.25,4.45],
// 3 16 16.4 -.25 6.9 14.23 -.25 4.45 14.57 -.25 4.02
  [3,16,16.4,-.25,6.9,14.23,-.25,4.45,14.57,-.25,4.02],
// 3 16 16.4 -.25 6.9 14.57 -.25 4.02 14.8 -.25 3.34
  [3,16,16.4,-.25,6.9,14.57,-.25,4.02,14.8,-.25,3.34],
// 3 16 16.4 -.25 6.9 14.8 -.25 3.34 14.87 -.25 2.35
  [3,16,16.4,-.25,6.9,14.8,-.25,3.34,14.87,-.25,2.35],
// 4 16 16.4 -.25 6.9 14.87 -.25 2.35 14.87 -.25 -1.82 16.4 -.25 -6.9
  [4,16,16.4,-.25,6.9,14.87,-.25,2.35,14.87,-.25,-1.82,16.4,-.25,-6.9],
// 3 16 14.87 -.25 -1.82 14.87 -.25 -4.2 16.4 -.25 -6.9
  [3,16,14.87,-.25,-1.82,14.87,-.25,-4.2,16.4,-.25,-6.9],
// 3 16 14.87 -.25 -4.2 13.1 -.25 -4.2 16.4 -.25 -6.9
  [3,16,14.87,-.25,-4.2,13.1,-.25,-4.2,16.4,-.25,-6.9],
// 3 16 13.1 -.25 -4.2 12.51 -.25 -4.2 16.4 -.25 -6.9
  [3,16,13.1,-.25,-4.2,12.51,-.25,-4.2,16.4,-.25,-6.9],
// 3 16 12.51 -.25 -4.2 10.6 -.25 -4.2 16.4 -.25 -6.9
  [3,16,12.51,-.25,-4.2,10.6,-.25,-4.2,16.4,-.25,-6.9],
// 4 16 16.4 -.25 -6.9 10.6 -.25 -4.2 9.73 -.25 -4.2 6.9 -.25 -16.4
  [4,16,16.4,-.25,-6.9,10.6,-.25,-4.2,9.73,-.25,-4.2,6.9,-.25,-16.4],
// 3 16 9.73 -.25 -4.2 6.41 -.25 -4.2 6.9 -.25 -16.4
  [3,16,9.73,-.25,-4.2,6.41,-.25,-4.2,6.9,-.25,-16.4],
// 4 16 5.37 -.25 -4.2 6.9 -.25 -16.4 6.41 -.25 -4.2 5.37 -.25 .63
  [4,16,5.37,-.25,-4.2,6.9,-.25,-16.4,6.41,-.25,-4.2,5.37,-.25,.63],
// 3 16 5.37 -.25 -4.2 4.17 -.25 -4.2 6.9 -.25 -16.4
  [3,16,5.37,-.25,-4.2,4.17,-.25,-4.2,6.9,-.25,-16.4],
// 3 16 2.33 -.25 -4.32 6.9 -.25 -16.4 2.8 -.25 -4.39
  [3,16,2.33,-.25,-4.32,6.9,-.25,-16.4,2.8,-.25,-4.39],
// 4 16 6.9 -.25 -16.4 2.33 -.25 -4.32 1.89 -.25 -4.11 -.06 -.25 -4.2
  [4,16,6.9,-.25,-16.4,2.33,-.25,-4.32,1.89,-.25,-4.11,-.06,-.25,-4.2],
// 4 16 -6.9 -.25 -16.4 6.9 -.25 -16.4 -.06 -.25 -4.2 -1.74 -.25 -4.2
  [4,16,-6.9,-.25,-16.4,6.9,-.25,-16.4,-.06,-.25,-4.2,-1.74,-.25,-4.2],
// 3 16 -1.74 -.25 -4.2 -2.73 -.25 -4.2 -6.9 -.25 -16.4
  [3,16,-1.74,-.25,-4.2,-2.73,-.25,-4.2,-6.9,-.25,-16.4],
// 3 16 -2.73 -.25 -4.2 -4.34 -.25 -4.2 -6.9 -.25 -16.4
  [3,16,-2.73,-.25,-4.2,-4.34,-.25,-4.2,-6.9,-.25,-16.4],
// 3 16 -4.34 -.25 -4.2 -5.2 -.25 -4.2 -6.9 -.25 -16.4
  [3,16,-4.34,-.25,-4.2,-5.2,-.25,-4.2,-6.9,-.25,-16.4],
// 3 16 -12.6 -.25 -4.2 -15.02 -.25 -4.2 -16.4 -.25 -6.9
  [3,16,-12.6,-.25,-4.2,-15.02,-.25,-4.2,-16.4,-.25,-6.9],
// 4 16 -11.57 -.25 -4.11 -12.6 -.25 -4.2 -16.4 -.25 -6.9 -10.03 -.25 -4.2
  [4,16,-11.57,-.25,-4.11,-12.6,-.25,-4.2,-16.4,-.25,-6.9,-10.03,-.25,-4.2],
// 4 16 -10.03 -.25 -4.2 -16.4 -.25 -6.9 -6.9 -.25 -16.4 -8.04 -.25 -4.2
  [4,16,-10.03,-.25,-4.2,-16.4,-.25,-6.9,-6.9,-.25,-16.4,-8.04,-.25,-4.2],
// 3 16 -7.15 -.25 -4.2 -8.04 -.25 -4.2 -6.9 -.25 -16.4
  [3,16,-7.15,-.25,-4.2,-8.04,-.25,-4.2,-6.9,-.25,-16.4],
// 3 16 -5.2 -.25 -4.2 -7.15 -.25 -4.2 -6.9 -.25 -16.4
  [3,16,-5.2,-.25,-4.2,-7.15,-.25,-4.2,-6.9,-.25,-16.4],
// 3 16 -11 -.25 -3.79 -11.57 -.25 -4.11 -10.03 -.25 -4.2
  [3,16,-11,-.25,-3.79,-11.57,-.25,-4.11,-10.03,-.25,-4.2],
// 3 16 -10.68 -.25 -3.14 -11 -.25 -3.79 -10.03 -.25 -4.2
  [3,16,-10.68,-.25,-3.14,-11,-.25,-3.79,-10.03,-.25,-4.2],
// 4 16 -10.59 -.25 -1.53 -10.68 -.25 -3.14 -10.03 -.25 -4.2 -9.06 -.25 4.8
  [4,16,-10.59,-.25,-1.53,-10.68,-.25,-3.14,-10.03,-.25,-4.2,-9.06,-.25,4.8],
// 3 16 -9.06 -.25 4.8 -10.59 -.25 .01 -10.59 -.25 -1.53
  [3,16,-9.06,-.25,4.8,-10.59,-.25,.01,-10.59,-.25,-1.53],
// 3 16 -9.06 -.25 4.8 -10.59 -.25 .82 -10.59 -.25 .01
  [3,16,-9.06,-.25,4.8,-10.59,-.25,.82,-10.59,-.25,.01],
// 3 16 -9.06 -.25 4.8 -11.28 -.25 4.44 -10.97 -.25 4.14
  [3,16,-9.06,-.25,4.8,-11.28,-.25,4.44,-10.97,-.25,4.14],
// 3 16 -9.06 -.25 4.8 -10.97 -.25 4.14 -10.76 -.25 3.76
  [3,16,-9.06,-.25,4.8,-10.97,-.25,4.14,-10.76,-.25,3.76],
// 3 16 -9.06 -.25 4.8 -10.76 -.25 3.76 -10.65 -.25 3.34
  [3,16,-9.06,-.25,4.8,-10.76,-.25,3.76,-10.65,-.25,3.34],
// 3 16 -9.06 -.25 4.8 -10.65 -.25 3.34 -10.62 -.25 2.53
  [3,16,-9.06,-.25,4.8,-10.65,-.25,3.34,-10.62,-.25,2.53],
// 3 16 -9.06 -.25 4.8 -10.62 -.25 2.53 -10.59 -.25 1.63
  [3,16,-9.06,-.25,4.8,-10.62,-.25,2.53,-10.59,-.25,1.63],
// 3 16 -9.06 -.25 4.8 -10.59 -.25 1.63 -10.59 -.25 .82
  [3,16,-9.06,-.25,4.8,-10.59,-.25,1.63,-10.59,-.25,.82],
// 3 16 -4.34 -.25 4.8 -5.2 -.25 -4.2 -4.34 -.25 -4.2
  [3,16,-4.34,-.25,4.8,-5.2,-.25,-4.2,-4.34,-.25,-4.2],
// 3 16 1.52 -.25 -3.79 -.06 -.25 -4.2 1.89 -.25 -4.11
  [3,16,1.52,-.25,-3.79,-.06,-.25,-4.2,1.89,-.25,-4.11],
// 3 16 1.26 -.25 -3.4 -.06 -.25 -4.2 1.52 -.25 -3.79
  [3,16,1.26,-.25,-3.4,-.06,-.25,-4.2,1.52,-.25,-3.79],
// 3 16 .99 -.25 -2.51 -.06 -.25 -4.2 1.26 -.25 -3.4
  [3,16,.99,-.25,-2.51,-.06,-.25,-4.2,1.26,-.25,-3.4],
// 3 16 .93 -.25 -1.11 -.06 -.25 -4.2 .99 -.25 -2.51
  [3,16,.93,-.25,-1.11,-.06,-.25,-4.2,.99,-.25,-2.51],
// 3 16 .93 -.25 -.3 -.06 -.25 -4.2 .93 -.25 -1.11
  [3,16,.93,-.25,-.3,-.06,-.25,-4.2,.93,-.25,-1.11],
// 4 16 -.06 -.25 -4.2 .93 -.25 -.3 .93 -.25 .52 -.06 -.25 4.8
  [4,16,-.06,-.25,-4.2,.93,-.25,-.3,.93,-.25,.52,-.06,-.25,4.8],
// 3 16 -.06 -.25 4.8 .93 -.25 .52 .93 -.25 1.56
  [3,16,-.06,-.25,4.8,.93,-.25,.52,.93,-.25,1.56],
// 3 16 -.06 -.25 4.8 1.26 -.25 4 1.69 -.25 4.51
  [3,16,-.06,-.25,4.8,1.26,-.25,4,1.69,-.25,4.51],
// 3 16 -.06 -.25 4.8 1.04 -.25 3.44 1.26 -.25 4
  [3,16,-.06,-.25,4.8,1.04,-.25,3.44,1.26,-.25,4],
// 3 16 -.06 -.25 4.8 .98 -.25 2.37 1.04 -.25 3.44
  [3,16,-.06,-.25,4.8,.98,-.25,2.37,1.04,-.25,3.44],
// 3 16 -.06 -.25 4.8 .93 -.25 1.56 .98 -.25 2.37
  [3,16,-.06,-.25,4.8,.93,-.25,1.56,.98,-.25,2.37],
// 3 16 6.41 -.25 4.8 4.48 -.25 4.57 4.94 -.25 4.11
  [3,16,6.41,-.25,4.8,4.48,-.25,4.57,4.94,-.25,4.11],
// 3 16 6.41 -.25 4.8 4.94 -.25 4.11 5.21 -.25 3.57
  [3,16,6.41,-.25,4.8,4.94,-.25,4.11,5.21,-.25,3.57],
// 3 16 6.41 -.25 4.8 5.21 -.25 3.57 5.33 -.25 2.85
  [3,16,6.41,-.25,4.8,5.21,-.25,3.57,5.33,-.25,2.85],
// 3 16 6.41 -.25 4.8 5.33 -.25 2.85 5.37 -.25 1.88
  [3,16,6.41,-.25,4.8,5.33,-.25,2.85,5.37,-.25,1.88],
// 3 16 6.41 -.25 4.8 5.37 -.25 1.88 5.37 -.25 1.49
  [3,16,6.41,-.25,4.8,5.37,-.25,1.88,5.37,-.25,1.49],
// 4 16 6.41 -.25 4.8 5.37 -.25 1.49 5.37 -.25 .63 6.41 -.25 -4.2
  [4,16,6.41,-.25,4.8,5.37,-.25,1.49,5.37,-.25,.63,6.41,-.25,-4.2],
// 3 16 9.73 -.25 -2.4 9.73 -.25 -4.2 10.6 -.25 -4.2
  [3,16,9.73,-.25,-2.4,9.73,-.25,-4.2,10.6,-.25,-4.2],
// 4 16 9.52 -.25 -.41 9.73 -.25 -2.4 10.6 -.25 -4.2 9.52 -.25 1.29
  [4,16,9.52,-.25,-.41,9.73,-.25,-2.4,10.6,-.25,-4.2,9.52,-.25,1.29],
// 4 16 9.52 -.25 1.29 10.6 -.25 -4.2 10.6 -.25 4.8 9.6 -.25 3.01
  [4,16,9.52,-.25,1.29,10.6,-.25,-4.2,10.6,-.25,4.8,9.6,-.25,3.01],
// 3 16 10.6 -.25 4.8 9.6 -.25 4.8 9.6 -.25 3.01
  [3,16,10.6,-.25,4.8,9.6,-.25,4.8,9.6,-.25,3.01],
];
module ldraw_lib__4222889d(step=0, col=false, unit=2/5, alt=false, line=0.2, solid=!$preview)
    makepoly(ldraw_lib__4222889d(), step=step, col=col, unit=unit, alt=alt, line=line, solid=solid);
ldraw_lib__4222889d(line=0.2);
